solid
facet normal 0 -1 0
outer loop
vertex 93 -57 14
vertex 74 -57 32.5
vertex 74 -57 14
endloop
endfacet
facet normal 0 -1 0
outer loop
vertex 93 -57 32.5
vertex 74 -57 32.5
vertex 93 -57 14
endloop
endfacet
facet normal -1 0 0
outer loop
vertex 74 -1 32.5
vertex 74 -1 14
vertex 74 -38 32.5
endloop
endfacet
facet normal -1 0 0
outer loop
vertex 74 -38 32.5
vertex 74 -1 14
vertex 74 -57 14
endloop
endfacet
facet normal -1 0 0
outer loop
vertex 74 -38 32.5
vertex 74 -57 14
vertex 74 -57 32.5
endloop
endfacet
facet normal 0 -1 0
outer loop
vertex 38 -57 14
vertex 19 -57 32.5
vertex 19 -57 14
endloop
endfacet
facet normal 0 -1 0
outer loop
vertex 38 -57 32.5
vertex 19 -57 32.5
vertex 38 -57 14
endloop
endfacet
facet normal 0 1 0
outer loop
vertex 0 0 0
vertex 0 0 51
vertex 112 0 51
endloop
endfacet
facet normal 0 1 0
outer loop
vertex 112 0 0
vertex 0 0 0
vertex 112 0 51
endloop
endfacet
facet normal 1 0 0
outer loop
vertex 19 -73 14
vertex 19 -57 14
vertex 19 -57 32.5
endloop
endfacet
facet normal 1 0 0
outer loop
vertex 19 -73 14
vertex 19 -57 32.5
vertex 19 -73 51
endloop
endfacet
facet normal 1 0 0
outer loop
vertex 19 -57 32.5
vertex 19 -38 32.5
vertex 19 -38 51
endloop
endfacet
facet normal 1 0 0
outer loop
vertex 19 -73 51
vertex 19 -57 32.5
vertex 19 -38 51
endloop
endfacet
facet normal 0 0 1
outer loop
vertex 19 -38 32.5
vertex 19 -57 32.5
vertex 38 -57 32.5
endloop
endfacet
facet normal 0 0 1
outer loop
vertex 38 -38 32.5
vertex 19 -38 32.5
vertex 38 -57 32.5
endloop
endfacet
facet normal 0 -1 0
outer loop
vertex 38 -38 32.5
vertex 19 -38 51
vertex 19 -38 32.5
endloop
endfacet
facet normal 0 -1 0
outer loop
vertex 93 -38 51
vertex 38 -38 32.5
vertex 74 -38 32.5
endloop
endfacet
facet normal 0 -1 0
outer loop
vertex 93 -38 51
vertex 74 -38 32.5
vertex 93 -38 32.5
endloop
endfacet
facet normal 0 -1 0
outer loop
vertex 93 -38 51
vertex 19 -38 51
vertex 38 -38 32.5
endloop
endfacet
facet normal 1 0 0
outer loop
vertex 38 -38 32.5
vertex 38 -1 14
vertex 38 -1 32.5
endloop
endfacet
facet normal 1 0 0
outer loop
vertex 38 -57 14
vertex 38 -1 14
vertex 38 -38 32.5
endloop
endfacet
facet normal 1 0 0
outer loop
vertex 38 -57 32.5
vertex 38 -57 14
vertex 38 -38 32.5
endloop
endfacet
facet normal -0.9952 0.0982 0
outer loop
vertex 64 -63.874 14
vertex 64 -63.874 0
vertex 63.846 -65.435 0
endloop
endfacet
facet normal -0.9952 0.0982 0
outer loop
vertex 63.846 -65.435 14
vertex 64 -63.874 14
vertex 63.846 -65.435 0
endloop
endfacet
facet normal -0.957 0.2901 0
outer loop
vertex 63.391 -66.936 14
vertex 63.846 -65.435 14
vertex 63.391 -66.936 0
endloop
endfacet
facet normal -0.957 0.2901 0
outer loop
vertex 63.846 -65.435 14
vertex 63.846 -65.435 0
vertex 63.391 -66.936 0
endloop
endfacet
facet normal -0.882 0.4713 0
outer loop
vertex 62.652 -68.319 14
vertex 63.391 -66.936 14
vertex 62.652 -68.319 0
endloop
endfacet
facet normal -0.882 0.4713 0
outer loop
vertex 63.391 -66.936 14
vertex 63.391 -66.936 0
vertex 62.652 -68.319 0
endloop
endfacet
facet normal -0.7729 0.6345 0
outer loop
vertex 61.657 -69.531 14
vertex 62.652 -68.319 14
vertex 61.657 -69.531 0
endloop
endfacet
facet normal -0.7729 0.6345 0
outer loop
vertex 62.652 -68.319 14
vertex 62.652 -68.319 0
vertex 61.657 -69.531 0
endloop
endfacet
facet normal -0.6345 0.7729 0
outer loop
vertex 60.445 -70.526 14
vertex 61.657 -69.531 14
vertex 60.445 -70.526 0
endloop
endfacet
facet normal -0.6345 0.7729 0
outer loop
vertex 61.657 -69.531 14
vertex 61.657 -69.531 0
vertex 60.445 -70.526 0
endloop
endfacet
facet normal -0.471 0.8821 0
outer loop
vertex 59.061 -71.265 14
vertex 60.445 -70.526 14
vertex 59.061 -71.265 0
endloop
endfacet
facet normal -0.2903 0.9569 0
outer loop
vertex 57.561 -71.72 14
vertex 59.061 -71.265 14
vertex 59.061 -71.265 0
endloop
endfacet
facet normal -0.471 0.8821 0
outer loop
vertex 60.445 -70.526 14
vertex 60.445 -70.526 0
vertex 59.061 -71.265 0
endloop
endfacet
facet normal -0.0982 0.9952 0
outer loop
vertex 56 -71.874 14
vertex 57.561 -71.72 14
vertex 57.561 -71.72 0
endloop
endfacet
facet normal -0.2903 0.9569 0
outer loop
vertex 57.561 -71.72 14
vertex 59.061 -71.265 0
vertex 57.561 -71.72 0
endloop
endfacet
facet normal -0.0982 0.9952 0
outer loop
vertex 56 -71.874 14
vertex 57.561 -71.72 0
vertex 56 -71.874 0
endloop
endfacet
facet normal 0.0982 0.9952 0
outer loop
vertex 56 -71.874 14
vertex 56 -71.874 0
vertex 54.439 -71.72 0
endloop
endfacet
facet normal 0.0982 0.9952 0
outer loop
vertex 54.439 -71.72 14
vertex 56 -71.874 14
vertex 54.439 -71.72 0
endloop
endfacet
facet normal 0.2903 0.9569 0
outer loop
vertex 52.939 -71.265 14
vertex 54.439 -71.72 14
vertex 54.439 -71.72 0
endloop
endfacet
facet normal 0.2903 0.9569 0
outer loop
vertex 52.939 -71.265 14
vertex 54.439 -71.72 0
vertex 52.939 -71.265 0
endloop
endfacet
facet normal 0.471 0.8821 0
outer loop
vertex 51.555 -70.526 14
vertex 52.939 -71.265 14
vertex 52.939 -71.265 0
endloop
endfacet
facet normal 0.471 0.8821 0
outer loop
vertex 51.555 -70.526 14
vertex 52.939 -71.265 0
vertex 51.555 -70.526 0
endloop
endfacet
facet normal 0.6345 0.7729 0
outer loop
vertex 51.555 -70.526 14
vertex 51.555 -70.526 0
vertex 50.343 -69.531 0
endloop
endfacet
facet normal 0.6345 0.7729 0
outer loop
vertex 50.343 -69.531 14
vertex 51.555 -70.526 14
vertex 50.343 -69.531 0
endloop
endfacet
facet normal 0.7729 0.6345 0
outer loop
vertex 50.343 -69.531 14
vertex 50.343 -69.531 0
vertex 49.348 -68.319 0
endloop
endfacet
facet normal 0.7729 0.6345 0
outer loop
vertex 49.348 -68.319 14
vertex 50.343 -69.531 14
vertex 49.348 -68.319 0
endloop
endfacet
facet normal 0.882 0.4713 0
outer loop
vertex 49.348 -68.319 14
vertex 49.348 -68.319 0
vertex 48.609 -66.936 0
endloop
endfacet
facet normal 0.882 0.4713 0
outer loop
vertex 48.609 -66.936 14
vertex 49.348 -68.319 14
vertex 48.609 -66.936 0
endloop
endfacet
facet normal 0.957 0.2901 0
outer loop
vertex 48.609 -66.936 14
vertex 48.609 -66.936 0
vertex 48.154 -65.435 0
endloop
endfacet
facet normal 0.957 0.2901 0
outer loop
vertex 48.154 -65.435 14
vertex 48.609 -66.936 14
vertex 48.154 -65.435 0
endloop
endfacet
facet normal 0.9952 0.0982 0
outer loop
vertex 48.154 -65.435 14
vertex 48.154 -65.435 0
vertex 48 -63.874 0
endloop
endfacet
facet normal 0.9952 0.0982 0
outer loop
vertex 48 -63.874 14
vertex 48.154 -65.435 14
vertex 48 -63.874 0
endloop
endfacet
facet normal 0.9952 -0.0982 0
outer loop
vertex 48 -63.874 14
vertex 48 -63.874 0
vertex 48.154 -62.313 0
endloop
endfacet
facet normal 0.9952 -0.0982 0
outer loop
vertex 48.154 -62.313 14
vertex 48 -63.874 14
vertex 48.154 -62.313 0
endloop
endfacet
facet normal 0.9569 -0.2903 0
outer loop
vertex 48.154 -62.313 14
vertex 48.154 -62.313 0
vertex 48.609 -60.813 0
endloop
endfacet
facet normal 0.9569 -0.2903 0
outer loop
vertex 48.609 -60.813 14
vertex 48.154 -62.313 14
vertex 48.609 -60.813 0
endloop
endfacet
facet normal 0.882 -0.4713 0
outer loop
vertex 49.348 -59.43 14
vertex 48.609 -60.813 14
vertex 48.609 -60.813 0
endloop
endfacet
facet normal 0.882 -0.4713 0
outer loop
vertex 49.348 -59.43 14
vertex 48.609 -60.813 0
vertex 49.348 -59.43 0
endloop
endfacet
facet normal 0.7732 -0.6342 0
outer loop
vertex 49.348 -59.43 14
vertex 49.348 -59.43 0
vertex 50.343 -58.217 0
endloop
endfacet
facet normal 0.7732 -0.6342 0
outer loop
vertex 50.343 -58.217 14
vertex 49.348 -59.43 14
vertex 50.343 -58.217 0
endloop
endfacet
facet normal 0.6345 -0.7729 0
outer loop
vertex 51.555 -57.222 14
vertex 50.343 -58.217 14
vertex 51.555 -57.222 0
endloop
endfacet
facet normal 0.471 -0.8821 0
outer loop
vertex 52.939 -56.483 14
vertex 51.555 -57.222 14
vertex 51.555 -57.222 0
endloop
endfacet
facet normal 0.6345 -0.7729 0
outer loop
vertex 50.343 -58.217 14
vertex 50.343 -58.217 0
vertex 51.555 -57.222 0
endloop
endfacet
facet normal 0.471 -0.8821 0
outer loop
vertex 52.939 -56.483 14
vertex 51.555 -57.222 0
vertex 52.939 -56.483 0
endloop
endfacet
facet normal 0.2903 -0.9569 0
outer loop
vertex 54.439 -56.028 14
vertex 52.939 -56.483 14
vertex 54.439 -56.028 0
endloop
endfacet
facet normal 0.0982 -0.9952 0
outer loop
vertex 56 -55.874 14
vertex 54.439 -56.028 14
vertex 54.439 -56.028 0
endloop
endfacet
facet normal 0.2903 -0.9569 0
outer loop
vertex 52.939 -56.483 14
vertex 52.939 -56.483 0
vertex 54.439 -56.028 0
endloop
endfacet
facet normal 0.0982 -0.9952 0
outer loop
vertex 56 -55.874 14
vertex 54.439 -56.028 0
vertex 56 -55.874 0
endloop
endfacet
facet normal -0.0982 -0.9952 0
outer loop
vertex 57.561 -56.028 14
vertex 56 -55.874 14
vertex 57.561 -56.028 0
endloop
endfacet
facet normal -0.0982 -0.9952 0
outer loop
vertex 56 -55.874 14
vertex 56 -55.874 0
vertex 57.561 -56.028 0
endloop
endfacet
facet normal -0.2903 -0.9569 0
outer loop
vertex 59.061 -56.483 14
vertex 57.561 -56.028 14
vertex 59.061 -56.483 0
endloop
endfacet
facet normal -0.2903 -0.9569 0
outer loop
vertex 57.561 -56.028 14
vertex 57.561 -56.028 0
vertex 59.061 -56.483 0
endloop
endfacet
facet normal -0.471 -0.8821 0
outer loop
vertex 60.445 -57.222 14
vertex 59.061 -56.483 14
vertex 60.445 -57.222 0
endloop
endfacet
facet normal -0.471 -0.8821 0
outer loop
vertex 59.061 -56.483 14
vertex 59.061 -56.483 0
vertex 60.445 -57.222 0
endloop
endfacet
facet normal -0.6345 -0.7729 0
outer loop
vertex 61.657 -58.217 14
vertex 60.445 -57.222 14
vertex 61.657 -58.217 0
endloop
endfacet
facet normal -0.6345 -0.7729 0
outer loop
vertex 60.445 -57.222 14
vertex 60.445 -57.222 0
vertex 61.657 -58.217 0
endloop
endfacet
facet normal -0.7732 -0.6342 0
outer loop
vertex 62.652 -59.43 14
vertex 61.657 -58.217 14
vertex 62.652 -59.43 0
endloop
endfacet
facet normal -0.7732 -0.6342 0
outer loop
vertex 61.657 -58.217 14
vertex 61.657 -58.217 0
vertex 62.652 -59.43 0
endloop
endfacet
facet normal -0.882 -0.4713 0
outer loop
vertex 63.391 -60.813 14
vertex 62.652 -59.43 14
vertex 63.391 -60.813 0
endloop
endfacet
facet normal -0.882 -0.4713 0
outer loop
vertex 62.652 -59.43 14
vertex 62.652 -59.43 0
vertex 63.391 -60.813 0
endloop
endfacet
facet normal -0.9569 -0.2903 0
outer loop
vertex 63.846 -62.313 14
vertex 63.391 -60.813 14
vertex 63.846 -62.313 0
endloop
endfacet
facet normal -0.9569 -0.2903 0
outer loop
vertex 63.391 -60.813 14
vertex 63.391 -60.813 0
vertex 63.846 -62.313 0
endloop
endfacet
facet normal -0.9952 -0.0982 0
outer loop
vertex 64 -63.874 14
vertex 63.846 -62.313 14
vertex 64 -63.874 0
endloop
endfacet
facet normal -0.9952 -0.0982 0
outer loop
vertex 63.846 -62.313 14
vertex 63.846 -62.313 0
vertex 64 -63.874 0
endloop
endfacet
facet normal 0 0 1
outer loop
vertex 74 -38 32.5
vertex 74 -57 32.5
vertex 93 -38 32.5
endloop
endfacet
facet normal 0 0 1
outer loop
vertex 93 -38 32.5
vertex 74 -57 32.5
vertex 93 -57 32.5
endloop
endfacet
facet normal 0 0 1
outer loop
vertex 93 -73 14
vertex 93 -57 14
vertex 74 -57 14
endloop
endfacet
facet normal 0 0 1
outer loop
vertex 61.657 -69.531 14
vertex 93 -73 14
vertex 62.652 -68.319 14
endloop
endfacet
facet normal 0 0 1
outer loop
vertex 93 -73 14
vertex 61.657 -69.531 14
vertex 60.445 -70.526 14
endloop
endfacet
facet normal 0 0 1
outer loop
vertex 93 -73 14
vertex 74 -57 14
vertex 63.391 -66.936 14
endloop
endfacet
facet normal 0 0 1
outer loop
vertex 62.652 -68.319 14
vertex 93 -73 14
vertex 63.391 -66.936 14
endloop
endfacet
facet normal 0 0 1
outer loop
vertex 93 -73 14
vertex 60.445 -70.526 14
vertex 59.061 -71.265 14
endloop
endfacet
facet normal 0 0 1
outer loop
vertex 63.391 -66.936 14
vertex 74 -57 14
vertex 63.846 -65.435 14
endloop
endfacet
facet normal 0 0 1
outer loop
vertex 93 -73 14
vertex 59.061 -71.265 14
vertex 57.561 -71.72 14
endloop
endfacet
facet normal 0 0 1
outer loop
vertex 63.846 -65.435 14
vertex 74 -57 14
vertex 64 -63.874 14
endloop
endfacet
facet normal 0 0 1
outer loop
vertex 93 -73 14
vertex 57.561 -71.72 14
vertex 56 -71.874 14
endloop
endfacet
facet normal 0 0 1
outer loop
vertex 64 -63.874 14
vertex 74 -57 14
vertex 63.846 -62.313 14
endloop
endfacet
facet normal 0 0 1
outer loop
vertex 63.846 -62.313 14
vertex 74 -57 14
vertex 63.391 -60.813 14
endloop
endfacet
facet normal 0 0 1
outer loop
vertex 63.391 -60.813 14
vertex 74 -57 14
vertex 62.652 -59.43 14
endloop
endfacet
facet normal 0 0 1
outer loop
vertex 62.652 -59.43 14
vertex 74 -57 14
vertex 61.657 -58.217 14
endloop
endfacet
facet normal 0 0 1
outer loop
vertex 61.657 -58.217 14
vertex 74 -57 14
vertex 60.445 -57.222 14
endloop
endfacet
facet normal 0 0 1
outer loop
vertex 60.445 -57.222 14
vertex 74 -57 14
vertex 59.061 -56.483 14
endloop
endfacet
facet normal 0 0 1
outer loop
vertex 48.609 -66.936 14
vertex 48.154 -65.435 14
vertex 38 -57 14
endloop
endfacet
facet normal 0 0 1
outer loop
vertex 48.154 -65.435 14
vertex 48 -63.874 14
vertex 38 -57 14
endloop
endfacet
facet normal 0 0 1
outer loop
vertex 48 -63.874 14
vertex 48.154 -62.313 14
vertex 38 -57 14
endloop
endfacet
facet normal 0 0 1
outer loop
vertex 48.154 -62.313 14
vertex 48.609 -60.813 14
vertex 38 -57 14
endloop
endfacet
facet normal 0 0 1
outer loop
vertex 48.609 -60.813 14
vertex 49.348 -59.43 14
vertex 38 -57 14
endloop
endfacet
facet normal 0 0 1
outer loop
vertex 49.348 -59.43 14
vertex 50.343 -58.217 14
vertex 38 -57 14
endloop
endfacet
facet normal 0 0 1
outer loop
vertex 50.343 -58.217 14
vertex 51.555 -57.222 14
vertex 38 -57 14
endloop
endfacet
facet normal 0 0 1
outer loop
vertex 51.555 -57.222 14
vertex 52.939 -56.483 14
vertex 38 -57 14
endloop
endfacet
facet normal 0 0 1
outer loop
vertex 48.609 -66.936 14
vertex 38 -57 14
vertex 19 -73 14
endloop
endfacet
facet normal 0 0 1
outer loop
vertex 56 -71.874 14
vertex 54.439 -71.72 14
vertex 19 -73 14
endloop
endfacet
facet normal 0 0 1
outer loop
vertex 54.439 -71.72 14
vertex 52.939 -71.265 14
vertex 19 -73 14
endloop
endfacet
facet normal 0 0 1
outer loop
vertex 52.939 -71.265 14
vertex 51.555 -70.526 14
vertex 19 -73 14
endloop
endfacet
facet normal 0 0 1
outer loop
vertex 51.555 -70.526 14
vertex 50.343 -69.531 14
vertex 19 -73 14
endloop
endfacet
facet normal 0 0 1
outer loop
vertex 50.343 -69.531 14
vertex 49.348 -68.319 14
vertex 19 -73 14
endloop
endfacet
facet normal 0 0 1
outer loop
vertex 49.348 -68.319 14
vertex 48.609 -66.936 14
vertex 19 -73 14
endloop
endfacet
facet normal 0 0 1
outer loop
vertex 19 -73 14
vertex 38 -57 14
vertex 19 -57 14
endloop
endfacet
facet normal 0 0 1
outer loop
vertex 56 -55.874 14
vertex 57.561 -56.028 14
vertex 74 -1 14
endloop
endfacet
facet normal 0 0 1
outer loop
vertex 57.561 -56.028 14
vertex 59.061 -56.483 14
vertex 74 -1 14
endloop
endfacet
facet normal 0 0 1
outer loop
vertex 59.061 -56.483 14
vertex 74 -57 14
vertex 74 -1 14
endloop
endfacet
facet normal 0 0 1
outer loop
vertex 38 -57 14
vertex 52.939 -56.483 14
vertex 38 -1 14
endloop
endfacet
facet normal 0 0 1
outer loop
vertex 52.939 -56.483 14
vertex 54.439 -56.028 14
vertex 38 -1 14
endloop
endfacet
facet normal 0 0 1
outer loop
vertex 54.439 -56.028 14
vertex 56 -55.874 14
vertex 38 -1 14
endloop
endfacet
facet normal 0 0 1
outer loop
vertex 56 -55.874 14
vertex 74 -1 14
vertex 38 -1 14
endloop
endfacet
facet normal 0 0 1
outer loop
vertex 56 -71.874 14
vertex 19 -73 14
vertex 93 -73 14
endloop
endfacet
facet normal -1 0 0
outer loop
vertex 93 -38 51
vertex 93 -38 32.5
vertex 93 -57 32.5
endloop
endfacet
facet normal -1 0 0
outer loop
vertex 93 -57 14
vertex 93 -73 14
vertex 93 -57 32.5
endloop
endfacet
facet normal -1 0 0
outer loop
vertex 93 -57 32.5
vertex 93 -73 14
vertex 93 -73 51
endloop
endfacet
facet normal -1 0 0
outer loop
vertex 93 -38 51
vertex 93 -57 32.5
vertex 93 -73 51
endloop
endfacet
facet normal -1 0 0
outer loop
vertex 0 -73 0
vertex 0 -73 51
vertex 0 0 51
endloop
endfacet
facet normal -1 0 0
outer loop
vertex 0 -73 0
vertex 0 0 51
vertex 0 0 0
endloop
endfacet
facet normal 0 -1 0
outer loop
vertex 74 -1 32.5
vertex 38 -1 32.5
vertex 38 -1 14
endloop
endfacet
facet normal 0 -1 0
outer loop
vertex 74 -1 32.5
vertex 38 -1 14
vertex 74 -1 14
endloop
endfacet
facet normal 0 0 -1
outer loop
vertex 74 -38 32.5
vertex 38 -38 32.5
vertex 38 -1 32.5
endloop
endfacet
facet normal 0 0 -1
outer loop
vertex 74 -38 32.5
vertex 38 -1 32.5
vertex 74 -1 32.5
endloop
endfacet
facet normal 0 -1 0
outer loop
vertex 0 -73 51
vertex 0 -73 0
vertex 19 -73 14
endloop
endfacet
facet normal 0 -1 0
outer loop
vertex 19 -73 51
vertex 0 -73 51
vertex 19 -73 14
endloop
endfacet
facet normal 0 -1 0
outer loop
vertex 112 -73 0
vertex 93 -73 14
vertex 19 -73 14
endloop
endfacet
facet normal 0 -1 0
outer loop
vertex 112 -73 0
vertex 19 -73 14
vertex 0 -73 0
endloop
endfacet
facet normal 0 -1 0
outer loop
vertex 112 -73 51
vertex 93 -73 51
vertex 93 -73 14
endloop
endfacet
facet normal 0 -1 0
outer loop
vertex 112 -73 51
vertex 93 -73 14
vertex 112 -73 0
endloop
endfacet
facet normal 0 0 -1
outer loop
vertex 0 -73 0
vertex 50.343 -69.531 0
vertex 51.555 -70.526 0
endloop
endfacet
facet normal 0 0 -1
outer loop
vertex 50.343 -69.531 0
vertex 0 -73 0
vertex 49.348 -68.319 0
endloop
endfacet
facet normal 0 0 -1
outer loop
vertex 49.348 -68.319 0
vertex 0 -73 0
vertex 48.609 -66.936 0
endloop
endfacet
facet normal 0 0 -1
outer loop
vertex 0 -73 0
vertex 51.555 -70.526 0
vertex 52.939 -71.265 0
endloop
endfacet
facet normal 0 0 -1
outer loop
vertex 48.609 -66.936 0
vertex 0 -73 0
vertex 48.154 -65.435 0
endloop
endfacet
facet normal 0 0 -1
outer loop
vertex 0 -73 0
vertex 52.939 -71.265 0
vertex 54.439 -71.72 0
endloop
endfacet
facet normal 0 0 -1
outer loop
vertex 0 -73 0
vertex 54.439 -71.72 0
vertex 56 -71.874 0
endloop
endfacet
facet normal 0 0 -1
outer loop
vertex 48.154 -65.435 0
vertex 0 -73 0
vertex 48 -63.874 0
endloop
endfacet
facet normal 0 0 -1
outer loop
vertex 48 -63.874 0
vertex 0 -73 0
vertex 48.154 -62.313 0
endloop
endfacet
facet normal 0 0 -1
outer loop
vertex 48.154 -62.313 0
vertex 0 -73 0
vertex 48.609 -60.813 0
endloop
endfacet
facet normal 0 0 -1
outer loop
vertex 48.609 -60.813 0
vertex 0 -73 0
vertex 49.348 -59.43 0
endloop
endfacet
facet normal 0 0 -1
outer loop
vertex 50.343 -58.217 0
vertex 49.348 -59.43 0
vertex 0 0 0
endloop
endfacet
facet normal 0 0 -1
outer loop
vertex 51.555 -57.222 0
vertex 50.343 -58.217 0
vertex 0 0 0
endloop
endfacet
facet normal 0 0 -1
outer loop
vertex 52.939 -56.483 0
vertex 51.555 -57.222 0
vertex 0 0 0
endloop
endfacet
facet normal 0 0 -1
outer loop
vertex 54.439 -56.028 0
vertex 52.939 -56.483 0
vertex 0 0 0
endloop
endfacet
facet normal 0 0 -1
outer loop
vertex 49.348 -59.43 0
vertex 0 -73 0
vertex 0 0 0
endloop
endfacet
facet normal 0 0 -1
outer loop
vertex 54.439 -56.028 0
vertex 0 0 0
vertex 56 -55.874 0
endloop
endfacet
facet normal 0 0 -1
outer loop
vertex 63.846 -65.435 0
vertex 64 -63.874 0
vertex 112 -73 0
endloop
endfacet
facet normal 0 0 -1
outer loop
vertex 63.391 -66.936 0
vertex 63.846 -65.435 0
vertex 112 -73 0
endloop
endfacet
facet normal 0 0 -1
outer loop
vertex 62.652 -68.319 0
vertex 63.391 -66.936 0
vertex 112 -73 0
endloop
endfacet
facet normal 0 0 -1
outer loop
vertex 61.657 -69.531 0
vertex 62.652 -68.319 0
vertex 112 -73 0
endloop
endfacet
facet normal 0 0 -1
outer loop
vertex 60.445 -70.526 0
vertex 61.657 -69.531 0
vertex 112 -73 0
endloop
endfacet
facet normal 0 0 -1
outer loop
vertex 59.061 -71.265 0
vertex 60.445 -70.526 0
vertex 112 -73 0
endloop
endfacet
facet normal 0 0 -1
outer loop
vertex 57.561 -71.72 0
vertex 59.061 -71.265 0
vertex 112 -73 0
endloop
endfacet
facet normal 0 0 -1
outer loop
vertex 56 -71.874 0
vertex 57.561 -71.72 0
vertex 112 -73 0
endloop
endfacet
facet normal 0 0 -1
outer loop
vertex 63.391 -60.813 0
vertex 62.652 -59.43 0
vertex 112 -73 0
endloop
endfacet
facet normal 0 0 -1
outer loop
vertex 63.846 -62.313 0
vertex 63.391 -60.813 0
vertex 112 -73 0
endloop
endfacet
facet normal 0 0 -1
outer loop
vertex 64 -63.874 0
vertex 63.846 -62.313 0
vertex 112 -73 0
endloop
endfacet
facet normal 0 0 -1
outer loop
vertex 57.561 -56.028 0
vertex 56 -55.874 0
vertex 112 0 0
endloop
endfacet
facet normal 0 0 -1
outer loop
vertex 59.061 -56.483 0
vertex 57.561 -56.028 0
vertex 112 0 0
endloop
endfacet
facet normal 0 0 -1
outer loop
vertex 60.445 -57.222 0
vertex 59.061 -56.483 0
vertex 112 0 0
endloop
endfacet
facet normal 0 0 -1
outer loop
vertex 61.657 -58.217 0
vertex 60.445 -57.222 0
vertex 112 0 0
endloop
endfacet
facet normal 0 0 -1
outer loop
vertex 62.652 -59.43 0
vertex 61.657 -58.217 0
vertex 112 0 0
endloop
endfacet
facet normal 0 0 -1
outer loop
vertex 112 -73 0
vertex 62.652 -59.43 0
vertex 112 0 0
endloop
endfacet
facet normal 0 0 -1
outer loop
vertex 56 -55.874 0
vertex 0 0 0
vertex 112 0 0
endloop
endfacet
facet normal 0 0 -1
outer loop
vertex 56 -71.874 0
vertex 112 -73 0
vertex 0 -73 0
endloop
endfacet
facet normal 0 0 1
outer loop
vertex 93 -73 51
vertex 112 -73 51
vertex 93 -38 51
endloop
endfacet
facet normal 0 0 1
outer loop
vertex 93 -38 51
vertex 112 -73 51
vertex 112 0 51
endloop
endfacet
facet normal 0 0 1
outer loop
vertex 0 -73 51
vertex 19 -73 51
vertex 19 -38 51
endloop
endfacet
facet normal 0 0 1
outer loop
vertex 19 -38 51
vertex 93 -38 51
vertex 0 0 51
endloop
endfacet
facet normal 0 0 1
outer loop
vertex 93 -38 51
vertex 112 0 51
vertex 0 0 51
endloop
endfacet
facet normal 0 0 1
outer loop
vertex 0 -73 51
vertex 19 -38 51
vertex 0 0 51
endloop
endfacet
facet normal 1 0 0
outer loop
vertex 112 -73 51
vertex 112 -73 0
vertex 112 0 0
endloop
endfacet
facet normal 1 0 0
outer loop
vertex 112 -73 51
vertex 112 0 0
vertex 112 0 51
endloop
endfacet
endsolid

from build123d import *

# Parameters (mm, degrees)
F0_W     = 112
F0_H     = 51
F1_DEPTH = 57
F3_DEPTH = 19
F4_DEPTH = 16
F2_W     = 36
F2_H     = 18.5
F5_DEPTH = 56
F6_R     = 8
F7_DEPTH = 16


with BuildPart() as f1:
    # F0 (on Front) → F1 (new body)
    with BuildSketch(Plane.XZ):
        with Locations((56, 25.5)):
            Rectangle(F0_W, F0_H)
    extrude(amount=F1_DEPTH)

    # F2 (on face) → F3 (cut)
    with BuildSketch(Plane.XZ.offset(57)):
        Polygon((93, 51), (19, 51), (19, 32.5), (38, 32.5), (74, 32.5), (93, 32.5), align=None)
    extrude(amount=-F3_DEPTH, mode=Mode.SUBTRACT)

    # F2 (on face) → F4 (join)
    with BuildSketch(Plane.XZ.offset(57)):
        Polygon((19, 32.5), (19, 51), (0, 51), (0, 0), (112, 0), (112, 51), (93, 51), (93, 32.5), (93, 14), (74, 14), (38, 14), (19, 14), align=None)
    extrude(amount=F4_DEPTH)

    # F2 (on face) → F5 (cut)
    with BuildSketch(Plane.XZ.offset(57)):
        with Locations((56, 23.25)):
            Rectangle(F2_W, F2_H)
    extrude(amount=-F5_DEPTH, mode=Mode.SUBTRACT)

    # F6 (on face) → F7 (cut)
    with BuildSketch(Plane(origin=(0, 0, 0), x_dir=(1, 0, 0), z_dir=(0, 0, -1))):
        with Locations((56, 63.874215)):
            Circle(F6_R)
    extrude(amount=-F7_DEPTH, mode=Mode.SUBTRACT)


solid = f1.part
